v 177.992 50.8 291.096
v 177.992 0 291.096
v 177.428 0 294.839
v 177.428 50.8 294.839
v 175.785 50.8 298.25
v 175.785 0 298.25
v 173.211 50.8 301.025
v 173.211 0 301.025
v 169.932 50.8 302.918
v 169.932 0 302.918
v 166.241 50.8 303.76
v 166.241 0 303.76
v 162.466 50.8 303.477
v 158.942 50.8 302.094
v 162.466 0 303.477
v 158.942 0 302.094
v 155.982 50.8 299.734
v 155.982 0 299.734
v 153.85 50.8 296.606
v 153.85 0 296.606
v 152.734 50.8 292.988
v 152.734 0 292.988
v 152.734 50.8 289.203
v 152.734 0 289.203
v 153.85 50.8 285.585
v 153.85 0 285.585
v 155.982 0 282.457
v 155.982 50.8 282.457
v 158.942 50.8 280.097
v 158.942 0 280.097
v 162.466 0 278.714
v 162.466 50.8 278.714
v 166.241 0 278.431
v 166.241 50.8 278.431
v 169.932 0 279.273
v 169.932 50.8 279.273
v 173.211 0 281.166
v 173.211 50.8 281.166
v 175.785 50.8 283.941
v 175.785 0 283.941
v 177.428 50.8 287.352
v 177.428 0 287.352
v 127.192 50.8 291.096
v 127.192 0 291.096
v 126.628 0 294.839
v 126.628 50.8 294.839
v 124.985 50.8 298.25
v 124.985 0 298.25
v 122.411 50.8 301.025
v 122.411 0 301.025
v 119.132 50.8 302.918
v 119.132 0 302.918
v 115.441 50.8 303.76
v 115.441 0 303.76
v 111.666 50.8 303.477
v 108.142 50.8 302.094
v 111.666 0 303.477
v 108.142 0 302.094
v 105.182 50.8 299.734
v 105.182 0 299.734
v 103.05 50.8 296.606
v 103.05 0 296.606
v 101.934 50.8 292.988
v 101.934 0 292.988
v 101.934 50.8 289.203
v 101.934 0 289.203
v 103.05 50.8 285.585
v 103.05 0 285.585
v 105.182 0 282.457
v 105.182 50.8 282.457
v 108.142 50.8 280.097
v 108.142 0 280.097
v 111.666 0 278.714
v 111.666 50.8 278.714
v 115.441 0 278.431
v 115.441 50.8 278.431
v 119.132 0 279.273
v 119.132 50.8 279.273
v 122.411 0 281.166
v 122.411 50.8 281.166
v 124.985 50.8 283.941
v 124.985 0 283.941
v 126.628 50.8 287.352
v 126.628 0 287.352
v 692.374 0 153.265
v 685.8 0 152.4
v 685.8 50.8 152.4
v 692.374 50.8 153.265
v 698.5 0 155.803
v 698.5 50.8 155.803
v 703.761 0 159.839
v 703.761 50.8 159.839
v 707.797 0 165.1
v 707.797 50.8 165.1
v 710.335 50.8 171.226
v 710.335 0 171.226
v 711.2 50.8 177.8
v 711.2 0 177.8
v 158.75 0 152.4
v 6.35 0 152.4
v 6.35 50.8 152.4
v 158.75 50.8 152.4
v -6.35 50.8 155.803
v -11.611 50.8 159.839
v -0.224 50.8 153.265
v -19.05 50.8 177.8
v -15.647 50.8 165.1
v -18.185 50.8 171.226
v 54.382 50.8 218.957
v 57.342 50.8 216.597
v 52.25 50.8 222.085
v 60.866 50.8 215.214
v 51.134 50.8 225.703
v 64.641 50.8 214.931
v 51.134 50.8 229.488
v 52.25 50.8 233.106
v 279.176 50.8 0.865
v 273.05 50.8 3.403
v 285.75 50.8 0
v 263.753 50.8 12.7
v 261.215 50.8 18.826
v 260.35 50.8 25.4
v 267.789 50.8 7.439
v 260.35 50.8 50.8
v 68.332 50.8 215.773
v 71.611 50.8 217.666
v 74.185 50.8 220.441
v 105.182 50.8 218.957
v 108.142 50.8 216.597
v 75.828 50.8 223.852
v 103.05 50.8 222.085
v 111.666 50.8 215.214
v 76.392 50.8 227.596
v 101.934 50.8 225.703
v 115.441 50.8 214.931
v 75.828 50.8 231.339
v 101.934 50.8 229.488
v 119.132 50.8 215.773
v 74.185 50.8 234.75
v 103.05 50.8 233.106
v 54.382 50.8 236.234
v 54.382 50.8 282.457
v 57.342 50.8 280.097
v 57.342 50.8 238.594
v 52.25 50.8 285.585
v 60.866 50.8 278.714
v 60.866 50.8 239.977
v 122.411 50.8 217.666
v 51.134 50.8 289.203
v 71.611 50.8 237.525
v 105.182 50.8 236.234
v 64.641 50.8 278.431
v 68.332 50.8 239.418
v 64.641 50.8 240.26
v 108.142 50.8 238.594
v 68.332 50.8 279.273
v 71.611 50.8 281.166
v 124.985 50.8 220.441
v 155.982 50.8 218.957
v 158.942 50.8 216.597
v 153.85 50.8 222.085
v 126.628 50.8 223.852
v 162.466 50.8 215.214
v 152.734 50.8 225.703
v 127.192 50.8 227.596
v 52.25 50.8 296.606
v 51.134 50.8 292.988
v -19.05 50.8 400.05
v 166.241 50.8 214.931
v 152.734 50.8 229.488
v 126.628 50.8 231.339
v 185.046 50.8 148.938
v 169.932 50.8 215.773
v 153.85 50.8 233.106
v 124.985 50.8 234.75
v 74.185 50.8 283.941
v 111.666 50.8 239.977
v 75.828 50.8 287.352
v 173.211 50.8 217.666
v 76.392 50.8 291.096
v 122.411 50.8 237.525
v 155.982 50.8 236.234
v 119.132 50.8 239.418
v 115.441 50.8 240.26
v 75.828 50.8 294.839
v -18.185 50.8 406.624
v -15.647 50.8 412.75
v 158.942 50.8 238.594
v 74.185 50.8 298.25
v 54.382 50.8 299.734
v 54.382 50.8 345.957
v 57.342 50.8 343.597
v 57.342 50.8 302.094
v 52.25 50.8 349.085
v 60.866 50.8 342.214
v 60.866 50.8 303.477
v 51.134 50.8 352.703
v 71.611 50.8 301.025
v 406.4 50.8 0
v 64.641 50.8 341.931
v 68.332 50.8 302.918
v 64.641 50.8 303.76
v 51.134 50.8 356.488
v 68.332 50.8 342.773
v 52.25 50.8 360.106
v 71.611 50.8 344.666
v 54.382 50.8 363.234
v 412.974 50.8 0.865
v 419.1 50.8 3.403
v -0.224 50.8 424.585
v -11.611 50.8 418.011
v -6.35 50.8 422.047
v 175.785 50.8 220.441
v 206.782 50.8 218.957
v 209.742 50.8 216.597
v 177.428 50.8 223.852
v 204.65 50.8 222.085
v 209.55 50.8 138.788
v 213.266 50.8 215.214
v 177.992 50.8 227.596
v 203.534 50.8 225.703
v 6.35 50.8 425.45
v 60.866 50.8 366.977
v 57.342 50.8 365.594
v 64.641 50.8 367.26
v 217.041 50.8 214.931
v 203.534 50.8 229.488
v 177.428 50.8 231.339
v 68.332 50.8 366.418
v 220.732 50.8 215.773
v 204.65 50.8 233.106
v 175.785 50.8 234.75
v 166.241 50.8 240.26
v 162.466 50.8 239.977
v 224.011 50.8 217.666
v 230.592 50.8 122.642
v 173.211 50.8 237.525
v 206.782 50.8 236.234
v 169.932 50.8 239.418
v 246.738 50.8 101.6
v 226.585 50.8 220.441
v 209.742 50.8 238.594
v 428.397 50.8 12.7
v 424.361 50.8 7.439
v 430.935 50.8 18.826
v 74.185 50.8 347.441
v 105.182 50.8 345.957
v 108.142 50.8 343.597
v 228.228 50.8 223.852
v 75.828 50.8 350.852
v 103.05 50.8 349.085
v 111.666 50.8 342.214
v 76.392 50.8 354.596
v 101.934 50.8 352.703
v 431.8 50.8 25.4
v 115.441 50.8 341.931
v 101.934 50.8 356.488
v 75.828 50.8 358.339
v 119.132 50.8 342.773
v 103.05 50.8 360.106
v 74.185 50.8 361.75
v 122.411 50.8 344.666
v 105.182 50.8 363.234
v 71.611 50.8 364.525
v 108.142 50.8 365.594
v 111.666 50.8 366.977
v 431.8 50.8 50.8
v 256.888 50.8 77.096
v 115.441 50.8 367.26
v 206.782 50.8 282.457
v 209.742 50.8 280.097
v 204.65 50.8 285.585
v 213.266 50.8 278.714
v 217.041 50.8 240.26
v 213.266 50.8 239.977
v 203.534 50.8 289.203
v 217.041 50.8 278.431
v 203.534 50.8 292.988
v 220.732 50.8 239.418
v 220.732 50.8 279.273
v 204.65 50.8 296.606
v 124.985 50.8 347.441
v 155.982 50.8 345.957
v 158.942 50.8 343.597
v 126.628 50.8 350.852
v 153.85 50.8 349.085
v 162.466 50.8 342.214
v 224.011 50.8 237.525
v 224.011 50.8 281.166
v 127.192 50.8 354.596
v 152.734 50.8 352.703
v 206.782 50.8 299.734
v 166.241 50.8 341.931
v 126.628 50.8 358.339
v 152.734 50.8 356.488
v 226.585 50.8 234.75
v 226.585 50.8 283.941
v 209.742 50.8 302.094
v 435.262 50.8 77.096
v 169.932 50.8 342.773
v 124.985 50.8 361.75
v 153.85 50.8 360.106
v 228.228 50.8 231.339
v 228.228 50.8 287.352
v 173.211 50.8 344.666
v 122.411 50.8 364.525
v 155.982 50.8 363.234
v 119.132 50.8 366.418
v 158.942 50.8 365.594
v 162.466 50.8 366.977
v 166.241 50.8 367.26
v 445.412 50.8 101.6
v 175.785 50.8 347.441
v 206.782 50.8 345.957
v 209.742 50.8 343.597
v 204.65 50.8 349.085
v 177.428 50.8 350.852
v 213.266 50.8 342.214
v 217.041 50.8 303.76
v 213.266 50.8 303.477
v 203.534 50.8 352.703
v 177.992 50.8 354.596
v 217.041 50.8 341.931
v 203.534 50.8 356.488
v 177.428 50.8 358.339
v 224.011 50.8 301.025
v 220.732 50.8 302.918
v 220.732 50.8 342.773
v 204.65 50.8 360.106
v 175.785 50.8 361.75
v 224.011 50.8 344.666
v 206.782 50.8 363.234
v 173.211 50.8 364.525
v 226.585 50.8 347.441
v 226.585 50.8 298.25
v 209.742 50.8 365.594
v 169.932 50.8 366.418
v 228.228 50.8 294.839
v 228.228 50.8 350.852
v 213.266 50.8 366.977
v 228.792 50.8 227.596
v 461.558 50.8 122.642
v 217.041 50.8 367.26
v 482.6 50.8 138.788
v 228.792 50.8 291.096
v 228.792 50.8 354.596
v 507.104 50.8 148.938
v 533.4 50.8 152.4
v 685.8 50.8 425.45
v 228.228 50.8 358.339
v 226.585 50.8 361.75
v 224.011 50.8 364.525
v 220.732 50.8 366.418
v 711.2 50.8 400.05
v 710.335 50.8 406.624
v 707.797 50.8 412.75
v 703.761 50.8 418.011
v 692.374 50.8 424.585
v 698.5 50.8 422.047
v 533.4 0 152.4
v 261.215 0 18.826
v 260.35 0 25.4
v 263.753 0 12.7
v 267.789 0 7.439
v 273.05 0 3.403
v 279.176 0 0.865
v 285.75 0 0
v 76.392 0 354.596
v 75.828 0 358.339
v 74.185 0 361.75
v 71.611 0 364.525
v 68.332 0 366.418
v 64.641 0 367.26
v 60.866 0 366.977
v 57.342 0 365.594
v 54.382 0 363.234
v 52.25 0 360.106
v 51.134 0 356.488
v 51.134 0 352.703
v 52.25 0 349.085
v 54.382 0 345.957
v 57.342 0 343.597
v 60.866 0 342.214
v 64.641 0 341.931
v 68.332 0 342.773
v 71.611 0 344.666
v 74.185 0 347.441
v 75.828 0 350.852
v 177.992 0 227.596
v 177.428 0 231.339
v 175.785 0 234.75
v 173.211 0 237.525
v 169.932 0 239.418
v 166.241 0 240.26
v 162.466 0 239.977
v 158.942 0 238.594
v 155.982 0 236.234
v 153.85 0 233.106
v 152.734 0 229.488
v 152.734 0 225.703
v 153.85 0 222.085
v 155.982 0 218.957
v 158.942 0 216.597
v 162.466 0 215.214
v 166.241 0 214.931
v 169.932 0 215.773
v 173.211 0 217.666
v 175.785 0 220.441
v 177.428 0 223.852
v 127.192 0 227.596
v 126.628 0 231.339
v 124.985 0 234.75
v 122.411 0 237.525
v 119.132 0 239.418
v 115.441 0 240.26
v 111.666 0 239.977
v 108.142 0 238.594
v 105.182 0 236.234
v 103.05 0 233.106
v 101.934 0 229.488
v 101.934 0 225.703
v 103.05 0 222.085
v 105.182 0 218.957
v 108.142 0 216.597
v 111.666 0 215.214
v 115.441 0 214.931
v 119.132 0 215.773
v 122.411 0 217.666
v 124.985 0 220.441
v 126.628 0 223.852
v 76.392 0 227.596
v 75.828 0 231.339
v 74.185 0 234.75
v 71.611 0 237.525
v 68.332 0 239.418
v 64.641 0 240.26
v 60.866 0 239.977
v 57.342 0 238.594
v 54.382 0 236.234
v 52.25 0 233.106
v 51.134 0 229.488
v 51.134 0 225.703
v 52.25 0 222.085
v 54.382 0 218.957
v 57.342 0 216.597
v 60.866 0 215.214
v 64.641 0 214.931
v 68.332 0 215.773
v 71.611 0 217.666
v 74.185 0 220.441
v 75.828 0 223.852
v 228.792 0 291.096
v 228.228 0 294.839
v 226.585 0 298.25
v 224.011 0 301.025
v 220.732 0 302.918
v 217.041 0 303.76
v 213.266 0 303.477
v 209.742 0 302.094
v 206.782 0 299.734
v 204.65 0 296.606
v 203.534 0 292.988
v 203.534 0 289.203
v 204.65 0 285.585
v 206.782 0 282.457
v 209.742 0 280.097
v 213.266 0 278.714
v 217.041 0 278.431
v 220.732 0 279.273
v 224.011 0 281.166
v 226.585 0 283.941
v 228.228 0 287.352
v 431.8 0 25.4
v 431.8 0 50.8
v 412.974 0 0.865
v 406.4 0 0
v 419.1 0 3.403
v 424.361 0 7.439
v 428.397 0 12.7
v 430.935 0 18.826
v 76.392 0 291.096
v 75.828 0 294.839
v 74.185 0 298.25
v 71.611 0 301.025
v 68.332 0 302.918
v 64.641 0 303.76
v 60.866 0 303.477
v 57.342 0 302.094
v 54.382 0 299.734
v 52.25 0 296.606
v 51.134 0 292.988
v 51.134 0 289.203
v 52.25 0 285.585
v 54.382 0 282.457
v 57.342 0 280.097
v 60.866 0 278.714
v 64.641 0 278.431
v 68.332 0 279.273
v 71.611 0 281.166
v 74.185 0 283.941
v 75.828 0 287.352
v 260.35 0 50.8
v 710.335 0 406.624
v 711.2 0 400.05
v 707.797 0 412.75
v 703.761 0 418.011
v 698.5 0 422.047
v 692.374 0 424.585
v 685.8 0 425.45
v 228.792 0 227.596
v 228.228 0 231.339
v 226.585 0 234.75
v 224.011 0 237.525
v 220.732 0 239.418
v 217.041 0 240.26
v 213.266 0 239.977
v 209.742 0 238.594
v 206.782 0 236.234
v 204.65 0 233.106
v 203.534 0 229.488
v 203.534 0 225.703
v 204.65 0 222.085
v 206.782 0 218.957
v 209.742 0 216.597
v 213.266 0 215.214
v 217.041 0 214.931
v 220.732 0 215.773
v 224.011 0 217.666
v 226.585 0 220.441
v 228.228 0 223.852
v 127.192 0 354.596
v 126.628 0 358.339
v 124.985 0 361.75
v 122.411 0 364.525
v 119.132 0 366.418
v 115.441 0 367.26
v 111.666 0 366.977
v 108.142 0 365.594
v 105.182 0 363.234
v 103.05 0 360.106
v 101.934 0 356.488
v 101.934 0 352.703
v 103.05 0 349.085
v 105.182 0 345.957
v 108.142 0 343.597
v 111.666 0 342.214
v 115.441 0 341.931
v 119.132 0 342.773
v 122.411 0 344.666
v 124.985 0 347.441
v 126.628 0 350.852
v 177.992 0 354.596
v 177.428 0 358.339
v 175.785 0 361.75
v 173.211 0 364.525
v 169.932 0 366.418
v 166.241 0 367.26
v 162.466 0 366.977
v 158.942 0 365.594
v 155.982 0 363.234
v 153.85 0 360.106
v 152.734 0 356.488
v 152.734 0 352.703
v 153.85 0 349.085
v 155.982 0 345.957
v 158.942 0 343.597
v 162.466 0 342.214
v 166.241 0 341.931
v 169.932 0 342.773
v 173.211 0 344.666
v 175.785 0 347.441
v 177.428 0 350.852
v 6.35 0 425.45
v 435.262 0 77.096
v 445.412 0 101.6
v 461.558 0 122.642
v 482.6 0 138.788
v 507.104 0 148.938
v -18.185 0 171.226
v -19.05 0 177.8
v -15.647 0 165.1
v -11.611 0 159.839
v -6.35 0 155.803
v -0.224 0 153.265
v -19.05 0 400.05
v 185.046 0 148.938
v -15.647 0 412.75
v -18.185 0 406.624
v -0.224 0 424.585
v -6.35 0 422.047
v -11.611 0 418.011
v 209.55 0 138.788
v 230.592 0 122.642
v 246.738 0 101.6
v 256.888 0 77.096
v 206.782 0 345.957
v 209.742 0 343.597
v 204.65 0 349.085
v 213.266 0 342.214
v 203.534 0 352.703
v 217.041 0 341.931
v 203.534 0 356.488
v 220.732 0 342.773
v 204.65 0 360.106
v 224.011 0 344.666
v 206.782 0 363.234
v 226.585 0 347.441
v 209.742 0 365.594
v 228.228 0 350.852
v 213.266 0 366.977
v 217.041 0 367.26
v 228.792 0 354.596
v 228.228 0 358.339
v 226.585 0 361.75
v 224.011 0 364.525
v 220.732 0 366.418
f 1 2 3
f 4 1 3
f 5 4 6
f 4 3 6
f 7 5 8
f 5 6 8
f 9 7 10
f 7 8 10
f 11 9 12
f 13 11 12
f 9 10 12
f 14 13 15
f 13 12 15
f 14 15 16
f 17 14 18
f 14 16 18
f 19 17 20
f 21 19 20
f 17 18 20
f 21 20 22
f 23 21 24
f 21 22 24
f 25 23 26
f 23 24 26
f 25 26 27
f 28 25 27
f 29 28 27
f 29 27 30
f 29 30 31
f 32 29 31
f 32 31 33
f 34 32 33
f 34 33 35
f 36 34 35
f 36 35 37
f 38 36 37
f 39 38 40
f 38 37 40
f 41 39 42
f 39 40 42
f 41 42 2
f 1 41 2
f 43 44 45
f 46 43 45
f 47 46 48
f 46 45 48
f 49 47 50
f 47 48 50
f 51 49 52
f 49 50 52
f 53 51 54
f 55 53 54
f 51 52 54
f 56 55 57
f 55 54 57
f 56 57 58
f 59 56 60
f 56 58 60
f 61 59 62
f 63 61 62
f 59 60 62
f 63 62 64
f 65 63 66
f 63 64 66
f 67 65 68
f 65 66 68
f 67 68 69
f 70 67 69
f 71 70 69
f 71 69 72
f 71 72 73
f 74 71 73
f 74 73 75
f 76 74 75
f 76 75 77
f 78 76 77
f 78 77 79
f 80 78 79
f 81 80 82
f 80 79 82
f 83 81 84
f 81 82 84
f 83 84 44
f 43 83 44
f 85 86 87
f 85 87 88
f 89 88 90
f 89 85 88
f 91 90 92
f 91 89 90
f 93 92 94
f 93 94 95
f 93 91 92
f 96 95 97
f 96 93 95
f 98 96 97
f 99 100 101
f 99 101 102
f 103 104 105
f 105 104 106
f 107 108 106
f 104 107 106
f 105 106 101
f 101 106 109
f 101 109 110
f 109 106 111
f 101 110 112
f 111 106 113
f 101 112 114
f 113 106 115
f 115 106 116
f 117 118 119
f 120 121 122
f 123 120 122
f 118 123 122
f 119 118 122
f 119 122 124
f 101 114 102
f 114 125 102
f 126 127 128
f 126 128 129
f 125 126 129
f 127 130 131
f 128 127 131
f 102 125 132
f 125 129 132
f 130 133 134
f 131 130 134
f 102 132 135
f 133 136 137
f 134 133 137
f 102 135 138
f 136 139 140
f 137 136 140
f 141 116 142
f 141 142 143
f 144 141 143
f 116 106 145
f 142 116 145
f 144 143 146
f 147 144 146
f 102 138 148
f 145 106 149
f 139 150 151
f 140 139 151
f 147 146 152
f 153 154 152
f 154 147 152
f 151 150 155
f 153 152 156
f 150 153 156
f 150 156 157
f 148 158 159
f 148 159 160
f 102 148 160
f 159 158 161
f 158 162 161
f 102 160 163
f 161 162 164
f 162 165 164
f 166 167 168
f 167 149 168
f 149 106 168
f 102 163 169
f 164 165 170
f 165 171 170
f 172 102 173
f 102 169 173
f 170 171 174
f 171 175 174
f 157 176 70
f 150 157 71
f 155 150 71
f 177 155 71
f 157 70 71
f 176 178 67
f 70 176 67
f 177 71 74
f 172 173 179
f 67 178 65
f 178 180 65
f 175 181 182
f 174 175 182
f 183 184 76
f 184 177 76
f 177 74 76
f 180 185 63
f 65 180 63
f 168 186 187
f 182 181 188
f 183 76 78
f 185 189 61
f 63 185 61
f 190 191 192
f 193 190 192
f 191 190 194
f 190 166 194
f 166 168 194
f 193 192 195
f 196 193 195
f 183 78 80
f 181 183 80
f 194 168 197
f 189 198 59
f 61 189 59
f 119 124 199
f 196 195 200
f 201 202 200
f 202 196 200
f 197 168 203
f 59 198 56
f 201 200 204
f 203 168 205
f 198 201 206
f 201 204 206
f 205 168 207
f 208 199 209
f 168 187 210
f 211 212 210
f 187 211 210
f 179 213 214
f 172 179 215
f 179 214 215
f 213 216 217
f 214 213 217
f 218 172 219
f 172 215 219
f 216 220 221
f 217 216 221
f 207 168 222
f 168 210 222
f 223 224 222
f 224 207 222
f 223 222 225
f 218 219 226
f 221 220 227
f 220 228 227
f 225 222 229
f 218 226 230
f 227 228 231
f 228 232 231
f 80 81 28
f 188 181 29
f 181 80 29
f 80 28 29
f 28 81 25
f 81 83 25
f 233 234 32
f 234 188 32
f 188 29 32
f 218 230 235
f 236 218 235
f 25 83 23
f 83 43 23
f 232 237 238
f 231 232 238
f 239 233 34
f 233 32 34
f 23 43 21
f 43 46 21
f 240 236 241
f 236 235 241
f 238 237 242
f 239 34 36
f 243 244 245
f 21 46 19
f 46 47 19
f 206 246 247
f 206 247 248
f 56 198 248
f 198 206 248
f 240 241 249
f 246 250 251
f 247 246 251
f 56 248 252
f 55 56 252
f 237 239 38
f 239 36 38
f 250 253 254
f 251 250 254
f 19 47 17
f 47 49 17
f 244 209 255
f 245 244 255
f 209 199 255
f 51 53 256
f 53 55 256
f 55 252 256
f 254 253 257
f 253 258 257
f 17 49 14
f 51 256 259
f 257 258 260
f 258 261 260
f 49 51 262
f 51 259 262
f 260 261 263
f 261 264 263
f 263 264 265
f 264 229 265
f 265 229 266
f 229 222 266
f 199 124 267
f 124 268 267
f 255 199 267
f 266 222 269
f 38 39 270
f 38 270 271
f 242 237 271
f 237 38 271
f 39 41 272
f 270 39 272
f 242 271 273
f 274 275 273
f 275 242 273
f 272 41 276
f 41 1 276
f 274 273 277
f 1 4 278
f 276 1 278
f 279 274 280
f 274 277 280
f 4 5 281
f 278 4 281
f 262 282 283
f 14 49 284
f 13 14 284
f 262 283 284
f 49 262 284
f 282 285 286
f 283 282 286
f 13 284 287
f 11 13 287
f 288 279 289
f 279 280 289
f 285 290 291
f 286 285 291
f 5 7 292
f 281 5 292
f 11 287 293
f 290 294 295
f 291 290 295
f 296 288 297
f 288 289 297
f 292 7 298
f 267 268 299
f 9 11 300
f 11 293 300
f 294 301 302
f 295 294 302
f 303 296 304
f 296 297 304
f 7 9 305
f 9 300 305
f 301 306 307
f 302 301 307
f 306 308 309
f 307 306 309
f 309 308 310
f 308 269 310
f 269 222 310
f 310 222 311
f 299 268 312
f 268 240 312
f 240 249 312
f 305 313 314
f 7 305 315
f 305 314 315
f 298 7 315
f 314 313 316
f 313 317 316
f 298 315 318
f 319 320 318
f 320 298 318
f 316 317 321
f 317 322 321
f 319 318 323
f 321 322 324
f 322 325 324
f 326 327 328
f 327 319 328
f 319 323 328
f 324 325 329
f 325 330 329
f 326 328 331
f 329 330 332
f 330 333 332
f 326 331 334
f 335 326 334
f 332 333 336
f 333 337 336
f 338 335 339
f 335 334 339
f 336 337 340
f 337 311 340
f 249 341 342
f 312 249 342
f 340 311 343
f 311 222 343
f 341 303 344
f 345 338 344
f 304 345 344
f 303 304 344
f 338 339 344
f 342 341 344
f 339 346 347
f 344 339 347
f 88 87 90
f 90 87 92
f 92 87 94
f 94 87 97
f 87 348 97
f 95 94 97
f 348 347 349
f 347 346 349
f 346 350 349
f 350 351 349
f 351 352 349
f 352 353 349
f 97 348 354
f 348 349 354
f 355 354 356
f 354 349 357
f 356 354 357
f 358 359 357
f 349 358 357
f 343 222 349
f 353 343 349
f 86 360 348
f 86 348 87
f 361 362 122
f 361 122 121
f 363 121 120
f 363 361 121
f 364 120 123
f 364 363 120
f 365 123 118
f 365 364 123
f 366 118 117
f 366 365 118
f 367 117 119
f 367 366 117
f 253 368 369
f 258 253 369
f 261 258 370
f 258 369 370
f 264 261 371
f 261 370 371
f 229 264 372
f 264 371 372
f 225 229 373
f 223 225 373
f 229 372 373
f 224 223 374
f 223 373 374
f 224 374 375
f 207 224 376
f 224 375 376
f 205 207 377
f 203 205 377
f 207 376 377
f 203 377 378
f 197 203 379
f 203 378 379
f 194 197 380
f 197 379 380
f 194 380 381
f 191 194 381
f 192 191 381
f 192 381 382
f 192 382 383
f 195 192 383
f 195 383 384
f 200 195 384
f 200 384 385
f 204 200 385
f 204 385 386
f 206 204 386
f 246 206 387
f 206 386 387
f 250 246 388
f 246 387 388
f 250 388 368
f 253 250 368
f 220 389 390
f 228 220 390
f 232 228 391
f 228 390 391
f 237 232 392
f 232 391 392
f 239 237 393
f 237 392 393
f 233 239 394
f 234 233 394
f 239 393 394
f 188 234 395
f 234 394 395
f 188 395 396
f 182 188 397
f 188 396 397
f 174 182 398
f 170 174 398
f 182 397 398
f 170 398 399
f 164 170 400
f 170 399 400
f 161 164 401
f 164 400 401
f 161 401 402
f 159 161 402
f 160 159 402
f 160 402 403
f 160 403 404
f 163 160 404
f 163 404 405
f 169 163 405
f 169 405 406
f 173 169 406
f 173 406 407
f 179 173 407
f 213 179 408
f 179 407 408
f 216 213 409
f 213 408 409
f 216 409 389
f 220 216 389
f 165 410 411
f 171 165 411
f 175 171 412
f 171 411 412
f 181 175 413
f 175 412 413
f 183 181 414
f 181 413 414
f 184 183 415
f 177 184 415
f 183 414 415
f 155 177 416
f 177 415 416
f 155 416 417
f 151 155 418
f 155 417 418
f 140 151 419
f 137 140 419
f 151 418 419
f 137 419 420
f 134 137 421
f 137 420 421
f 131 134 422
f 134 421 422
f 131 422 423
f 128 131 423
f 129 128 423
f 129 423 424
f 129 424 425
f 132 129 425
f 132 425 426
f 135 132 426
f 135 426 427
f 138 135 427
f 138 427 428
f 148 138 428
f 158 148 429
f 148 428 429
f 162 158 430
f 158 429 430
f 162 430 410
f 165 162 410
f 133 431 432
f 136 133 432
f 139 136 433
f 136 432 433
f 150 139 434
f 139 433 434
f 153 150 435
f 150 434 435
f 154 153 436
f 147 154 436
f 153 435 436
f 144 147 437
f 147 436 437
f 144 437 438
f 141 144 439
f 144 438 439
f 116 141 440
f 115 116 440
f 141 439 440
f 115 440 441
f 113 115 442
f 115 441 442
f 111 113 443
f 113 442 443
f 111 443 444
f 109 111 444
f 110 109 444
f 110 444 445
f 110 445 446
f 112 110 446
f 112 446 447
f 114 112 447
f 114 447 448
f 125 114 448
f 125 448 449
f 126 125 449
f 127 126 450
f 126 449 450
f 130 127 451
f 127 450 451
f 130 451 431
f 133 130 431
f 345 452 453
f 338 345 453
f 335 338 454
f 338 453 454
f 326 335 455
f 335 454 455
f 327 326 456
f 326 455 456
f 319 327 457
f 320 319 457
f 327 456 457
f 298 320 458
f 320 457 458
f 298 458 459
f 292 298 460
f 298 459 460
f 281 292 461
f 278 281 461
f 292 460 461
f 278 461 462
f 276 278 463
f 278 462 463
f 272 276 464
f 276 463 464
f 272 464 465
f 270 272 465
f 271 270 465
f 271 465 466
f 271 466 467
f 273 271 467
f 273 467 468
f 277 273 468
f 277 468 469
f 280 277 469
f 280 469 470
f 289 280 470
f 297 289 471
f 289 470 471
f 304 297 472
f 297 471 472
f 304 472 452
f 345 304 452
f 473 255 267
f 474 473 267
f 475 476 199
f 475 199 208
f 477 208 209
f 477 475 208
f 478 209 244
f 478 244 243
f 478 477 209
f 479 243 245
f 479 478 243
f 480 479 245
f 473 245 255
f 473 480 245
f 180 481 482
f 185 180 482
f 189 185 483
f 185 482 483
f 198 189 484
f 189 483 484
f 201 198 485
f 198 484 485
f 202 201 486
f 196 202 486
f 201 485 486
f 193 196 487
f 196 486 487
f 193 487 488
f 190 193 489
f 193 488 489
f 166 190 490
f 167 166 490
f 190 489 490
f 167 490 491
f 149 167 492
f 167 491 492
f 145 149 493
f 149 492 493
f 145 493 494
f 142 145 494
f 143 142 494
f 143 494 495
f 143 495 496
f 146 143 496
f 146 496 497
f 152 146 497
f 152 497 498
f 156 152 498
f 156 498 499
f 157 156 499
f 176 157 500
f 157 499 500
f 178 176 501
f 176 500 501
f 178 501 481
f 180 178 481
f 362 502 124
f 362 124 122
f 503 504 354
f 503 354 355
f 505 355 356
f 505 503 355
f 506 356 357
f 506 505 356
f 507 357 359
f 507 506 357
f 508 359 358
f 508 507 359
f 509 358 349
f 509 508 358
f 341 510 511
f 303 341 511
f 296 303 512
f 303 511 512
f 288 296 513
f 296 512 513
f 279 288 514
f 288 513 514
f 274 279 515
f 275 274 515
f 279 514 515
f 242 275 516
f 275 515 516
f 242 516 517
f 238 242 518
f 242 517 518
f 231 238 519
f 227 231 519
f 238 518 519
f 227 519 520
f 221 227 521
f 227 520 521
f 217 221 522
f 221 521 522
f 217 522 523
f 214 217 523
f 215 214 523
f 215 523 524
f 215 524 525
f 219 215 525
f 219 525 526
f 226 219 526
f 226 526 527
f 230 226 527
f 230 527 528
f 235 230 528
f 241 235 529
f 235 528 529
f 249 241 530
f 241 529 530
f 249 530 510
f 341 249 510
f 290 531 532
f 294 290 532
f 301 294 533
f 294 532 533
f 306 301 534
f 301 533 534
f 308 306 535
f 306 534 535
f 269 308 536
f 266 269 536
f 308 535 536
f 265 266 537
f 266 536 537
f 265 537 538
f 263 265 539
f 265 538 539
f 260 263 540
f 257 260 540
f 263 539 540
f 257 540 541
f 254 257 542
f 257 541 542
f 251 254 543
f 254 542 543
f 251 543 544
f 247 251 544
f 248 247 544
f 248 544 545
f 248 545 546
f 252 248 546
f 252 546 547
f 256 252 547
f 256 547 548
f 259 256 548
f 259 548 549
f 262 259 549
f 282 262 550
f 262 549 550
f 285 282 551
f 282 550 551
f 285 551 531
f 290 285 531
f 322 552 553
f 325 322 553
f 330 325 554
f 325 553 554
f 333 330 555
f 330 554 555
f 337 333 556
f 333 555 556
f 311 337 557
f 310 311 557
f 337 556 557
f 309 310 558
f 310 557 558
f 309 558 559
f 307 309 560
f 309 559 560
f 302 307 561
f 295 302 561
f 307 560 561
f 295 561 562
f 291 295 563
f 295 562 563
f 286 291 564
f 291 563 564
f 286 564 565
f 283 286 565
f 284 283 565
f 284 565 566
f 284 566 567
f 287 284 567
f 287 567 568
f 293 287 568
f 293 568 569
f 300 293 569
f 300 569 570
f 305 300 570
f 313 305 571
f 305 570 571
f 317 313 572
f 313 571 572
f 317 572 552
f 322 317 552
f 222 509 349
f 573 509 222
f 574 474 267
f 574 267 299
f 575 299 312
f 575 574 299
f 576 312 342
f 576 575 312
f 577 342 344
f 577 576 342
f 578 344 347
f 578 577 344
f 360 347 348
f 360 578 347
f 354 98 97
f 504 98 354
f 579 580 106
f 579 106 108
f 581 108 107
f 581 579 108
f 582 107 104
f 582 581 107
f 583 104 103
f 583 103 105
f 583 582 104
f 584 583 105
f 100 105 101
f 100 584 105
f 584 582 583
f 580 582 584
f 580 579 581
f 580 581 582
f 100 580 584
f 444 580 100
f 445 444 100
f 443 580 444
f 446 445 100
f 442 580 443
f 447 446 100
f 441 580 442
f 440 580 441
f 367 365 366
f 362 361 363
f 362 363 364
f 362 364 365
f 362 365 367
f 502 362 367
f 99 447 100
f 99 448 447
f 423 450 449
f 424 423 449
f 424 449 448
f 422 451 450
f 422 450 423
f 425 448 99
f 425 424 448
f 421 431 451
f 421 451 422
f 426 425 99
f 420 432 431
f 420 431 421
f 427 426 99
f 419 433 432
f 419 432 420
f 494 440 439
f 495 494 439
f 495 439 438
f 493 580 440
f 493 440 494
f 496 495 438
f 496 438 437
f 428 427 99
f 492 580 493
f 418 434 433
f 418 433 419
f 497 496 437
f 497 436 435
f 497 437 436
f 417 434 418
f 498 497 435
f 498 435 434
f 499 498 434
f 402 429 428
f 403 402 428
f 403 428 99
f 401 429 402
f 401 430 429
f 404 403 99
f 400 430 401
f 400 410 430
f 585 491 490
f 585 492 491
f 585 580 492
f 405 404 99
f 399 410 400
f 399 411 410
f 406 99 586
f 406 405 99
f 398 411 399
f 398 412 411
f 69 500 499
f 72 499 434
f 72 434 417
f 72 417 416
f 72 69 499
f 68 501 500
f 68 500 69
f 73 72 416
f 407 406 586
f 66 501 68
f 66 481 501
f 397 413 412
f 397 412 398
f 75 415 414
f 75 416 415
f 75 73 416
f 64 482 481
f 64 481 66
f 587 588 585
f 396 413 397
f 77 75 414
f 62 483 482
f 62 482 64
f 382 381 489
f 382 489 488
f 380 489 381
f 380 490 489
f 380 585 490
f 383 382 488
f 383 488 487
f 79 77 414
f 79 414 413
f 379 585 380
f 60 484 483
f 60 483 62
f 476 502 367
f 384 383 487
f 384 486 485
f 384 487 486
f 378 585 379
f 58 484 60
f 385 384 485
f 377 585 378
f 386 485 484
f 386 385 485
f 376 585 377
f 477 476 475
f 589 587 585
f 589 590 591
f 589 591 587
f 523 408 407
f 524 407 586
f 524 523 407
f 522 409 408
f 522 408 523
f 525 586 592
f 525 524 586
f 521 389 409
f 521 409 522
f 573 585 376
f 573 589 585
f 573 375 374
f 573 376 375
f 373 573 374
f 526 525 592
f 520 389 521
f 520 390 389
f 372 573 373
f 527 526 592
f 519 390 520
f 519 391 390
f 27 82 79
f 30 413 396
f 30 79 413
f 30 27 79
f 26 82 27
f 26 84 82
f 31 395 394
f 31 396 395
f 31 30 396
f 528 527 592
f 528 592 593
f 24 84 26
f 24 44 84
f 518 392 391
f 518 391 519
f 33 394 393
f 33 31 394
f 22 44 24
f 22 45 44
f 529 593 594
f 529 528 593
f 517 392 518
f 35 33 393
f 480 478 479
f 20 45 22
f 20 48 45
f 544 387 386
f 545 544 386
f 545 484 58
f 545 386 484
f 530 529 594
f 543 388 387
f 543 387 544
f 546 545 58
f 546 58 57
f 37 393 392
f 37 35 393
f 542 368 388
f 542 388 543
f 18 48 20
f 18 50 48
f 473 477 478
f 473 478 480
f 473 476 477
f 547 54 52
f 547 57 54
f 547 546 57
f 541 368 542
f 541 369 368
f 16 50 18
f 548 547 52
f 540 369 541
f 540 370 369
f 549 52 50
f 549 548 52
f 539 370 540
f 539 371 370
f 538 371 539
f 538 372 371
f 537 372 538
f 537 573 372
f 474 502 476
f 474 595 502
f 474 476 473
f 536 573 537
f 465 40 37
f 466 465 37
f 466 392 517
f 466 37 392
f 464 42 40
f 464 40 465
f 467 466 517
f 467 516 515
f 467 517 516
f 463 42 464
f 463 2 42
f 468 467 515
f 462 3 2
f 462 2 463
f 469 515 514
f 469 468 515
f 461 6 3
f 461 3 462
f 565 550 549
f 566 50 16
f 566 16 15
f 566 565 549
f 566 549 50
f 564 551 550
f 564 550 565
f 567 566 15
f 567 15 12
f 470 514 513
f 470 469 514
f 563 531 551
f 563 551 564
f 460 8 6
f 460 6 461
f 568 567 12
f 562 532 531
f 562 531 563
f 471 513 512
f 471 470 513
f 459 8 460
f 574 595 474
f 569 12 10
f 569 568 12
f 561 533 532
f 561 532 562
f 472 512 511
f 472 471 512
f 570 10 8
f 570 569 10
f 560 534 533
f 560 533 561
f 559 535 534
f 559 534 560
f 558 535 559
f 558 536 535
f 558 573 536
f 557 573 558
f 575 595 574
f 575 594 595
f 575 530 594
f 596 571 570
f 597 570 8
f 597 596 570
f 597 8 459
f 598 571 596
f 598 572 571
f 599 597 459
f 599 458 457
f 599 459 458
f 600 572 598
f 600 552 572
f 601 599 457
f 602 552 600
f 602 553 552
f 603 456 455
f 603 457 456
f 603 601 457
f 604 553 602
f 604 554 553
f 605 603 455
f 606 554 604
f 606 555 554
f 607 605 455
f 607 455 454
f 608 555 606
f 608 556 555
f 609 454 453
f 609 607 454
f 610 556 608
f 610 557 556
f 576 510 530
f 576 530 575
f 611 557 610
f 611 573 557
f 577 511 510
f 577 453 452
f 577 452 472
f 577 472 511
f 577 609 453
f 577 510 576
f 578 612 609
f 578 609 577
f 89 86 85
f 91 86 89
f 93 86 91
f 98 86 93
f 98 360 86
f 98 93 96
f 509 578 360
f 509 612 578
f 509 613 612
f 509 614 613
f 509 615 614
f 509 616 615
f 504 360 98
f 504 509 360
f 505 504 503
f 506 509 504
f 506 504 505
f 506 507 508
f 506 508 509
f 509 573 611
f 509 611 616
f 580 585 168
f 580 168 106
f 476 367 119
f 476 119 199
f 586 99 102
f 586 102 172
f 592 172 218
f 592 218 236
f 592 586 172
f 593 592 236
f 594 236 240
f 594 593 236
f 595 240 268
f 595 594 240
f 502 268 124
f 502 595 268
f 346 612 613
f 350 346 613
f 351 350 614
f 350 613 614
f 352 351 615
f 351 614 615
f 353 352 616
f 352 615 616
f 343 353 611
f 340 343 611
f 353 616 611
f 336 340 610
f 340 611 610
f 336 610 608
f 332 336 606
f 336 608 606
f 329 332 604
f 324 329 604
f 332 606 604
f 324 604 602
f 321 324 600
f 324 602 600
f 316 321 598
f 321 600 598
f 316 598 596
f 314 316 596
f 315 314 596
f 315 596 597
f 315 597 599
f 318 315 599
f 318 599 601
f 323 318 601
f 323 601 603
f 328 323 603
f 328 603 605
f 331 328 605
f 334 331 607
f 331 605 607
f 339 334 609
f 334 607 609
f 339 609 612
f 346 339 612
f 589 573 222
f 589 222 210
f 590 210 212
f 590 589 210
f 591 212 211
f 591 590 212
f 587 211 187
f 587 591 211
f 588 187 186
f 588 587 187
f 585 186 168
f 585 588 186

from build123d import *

# Parameters (mm, degrees)
F0_R     = 12.7
F1_DEPTH = 50.8


with BuildPart() as f1:
    # F0 (on Front) → F1 (new body)
    with BuildSketch(Plane.XZ):
        with BuildLine():
            ThreePointArc((260.35, 25.4), (267.789488, 7.439488), (285.75, 0))
            Line((285.75, 0), (406.4, 0))
            ThreePointArc((406.4, 0), (424.360512, 7.439488), (431.8, 25.4))
            Line((431.8, 25.4), (431.8, 50.8))
            ThreePointArc((431.8, 50.8), (461.557951, 122.642049), (533.4, 152.4))
            Line((533.4, 152.4), (685.8, 152.4))
            ThreePointArc((685.8, 152.4), (703.760512, 159.839488), (711.2, 177.8))
            Line((711.2, 177.8), (711.2, 400.05))
            ThreePointArc((711.2, 400.05), (703.760512, 418.010512), (685.8, 425.45))
            Line((685.8, 425.45), (6.35, 425.45))
            ThreePointArc((6.35, 425.45), (-11.610512, 418.010512), (-19.05, 400.05))
            Line((-19.05, 400.05), (-19.05, 177.8))
            ThreePointArc((-19.05, 177.8), (-11.610512, 159.839488), (6.35, 152.4))
            Line((6.35, 152.4), (158.75, 152.4))
            ThreePointArc((158.75, 152.4), (230.592049, 122.642049), (260.35, 50.8))
            Line((260.35, 50.8), (260.35, 25.4))
        make_face()
        with Locations((63.692227, 227.595572)):
            Circle(F0_R, mode=Mode.SUBTRACT)
        with Locations((114.492227, 227.595572)):
            Circle(F0_R, mode=Mode.SUBTRACT)
        with Locations((63.692227, 291.095572)):
            Circle(F0_R, mode=Mode.SUBTRACT)
        with Locations((114.492227, 291.095572)):
            Circle(F0_R, mode=Mode.SUBTRACT)
        with Locations((165.292227, 227.595572)):
            Circle(F0_R, mode=Mode.SUBTRACT)
        with Locations((216.092227, 227.595572)):
            Circle(F0_R, mode=Mode.SUBTRACT)
        with Locations((165.292227, 291.095572)):
            Circle(F0_R, mode=Mode.SUBTRACT)
        with Locations((216.092227, 291.095572)):
            Circle(F0_R, mode=Mode.SUBTRACT)
        with Locations((63.692227, 354.595572)):
            Circle(F0_R, mode=Mode.SUBTRACT)
        with Locations((114.492227, 354.595572)):
            Circle(F0_R, mode=Mode.SUBTRACT)
        with Locations((165.292227, 354.595572)):
            Circle(F0_R, mode=Mode.SUBTRACT)
        with Locations((216.092227, 354.595572)):
            Circle(F0_R, mode=Mode.SUBTRACT)
    extrude(amount=-F1_DEPTH)


solid = f1.part
